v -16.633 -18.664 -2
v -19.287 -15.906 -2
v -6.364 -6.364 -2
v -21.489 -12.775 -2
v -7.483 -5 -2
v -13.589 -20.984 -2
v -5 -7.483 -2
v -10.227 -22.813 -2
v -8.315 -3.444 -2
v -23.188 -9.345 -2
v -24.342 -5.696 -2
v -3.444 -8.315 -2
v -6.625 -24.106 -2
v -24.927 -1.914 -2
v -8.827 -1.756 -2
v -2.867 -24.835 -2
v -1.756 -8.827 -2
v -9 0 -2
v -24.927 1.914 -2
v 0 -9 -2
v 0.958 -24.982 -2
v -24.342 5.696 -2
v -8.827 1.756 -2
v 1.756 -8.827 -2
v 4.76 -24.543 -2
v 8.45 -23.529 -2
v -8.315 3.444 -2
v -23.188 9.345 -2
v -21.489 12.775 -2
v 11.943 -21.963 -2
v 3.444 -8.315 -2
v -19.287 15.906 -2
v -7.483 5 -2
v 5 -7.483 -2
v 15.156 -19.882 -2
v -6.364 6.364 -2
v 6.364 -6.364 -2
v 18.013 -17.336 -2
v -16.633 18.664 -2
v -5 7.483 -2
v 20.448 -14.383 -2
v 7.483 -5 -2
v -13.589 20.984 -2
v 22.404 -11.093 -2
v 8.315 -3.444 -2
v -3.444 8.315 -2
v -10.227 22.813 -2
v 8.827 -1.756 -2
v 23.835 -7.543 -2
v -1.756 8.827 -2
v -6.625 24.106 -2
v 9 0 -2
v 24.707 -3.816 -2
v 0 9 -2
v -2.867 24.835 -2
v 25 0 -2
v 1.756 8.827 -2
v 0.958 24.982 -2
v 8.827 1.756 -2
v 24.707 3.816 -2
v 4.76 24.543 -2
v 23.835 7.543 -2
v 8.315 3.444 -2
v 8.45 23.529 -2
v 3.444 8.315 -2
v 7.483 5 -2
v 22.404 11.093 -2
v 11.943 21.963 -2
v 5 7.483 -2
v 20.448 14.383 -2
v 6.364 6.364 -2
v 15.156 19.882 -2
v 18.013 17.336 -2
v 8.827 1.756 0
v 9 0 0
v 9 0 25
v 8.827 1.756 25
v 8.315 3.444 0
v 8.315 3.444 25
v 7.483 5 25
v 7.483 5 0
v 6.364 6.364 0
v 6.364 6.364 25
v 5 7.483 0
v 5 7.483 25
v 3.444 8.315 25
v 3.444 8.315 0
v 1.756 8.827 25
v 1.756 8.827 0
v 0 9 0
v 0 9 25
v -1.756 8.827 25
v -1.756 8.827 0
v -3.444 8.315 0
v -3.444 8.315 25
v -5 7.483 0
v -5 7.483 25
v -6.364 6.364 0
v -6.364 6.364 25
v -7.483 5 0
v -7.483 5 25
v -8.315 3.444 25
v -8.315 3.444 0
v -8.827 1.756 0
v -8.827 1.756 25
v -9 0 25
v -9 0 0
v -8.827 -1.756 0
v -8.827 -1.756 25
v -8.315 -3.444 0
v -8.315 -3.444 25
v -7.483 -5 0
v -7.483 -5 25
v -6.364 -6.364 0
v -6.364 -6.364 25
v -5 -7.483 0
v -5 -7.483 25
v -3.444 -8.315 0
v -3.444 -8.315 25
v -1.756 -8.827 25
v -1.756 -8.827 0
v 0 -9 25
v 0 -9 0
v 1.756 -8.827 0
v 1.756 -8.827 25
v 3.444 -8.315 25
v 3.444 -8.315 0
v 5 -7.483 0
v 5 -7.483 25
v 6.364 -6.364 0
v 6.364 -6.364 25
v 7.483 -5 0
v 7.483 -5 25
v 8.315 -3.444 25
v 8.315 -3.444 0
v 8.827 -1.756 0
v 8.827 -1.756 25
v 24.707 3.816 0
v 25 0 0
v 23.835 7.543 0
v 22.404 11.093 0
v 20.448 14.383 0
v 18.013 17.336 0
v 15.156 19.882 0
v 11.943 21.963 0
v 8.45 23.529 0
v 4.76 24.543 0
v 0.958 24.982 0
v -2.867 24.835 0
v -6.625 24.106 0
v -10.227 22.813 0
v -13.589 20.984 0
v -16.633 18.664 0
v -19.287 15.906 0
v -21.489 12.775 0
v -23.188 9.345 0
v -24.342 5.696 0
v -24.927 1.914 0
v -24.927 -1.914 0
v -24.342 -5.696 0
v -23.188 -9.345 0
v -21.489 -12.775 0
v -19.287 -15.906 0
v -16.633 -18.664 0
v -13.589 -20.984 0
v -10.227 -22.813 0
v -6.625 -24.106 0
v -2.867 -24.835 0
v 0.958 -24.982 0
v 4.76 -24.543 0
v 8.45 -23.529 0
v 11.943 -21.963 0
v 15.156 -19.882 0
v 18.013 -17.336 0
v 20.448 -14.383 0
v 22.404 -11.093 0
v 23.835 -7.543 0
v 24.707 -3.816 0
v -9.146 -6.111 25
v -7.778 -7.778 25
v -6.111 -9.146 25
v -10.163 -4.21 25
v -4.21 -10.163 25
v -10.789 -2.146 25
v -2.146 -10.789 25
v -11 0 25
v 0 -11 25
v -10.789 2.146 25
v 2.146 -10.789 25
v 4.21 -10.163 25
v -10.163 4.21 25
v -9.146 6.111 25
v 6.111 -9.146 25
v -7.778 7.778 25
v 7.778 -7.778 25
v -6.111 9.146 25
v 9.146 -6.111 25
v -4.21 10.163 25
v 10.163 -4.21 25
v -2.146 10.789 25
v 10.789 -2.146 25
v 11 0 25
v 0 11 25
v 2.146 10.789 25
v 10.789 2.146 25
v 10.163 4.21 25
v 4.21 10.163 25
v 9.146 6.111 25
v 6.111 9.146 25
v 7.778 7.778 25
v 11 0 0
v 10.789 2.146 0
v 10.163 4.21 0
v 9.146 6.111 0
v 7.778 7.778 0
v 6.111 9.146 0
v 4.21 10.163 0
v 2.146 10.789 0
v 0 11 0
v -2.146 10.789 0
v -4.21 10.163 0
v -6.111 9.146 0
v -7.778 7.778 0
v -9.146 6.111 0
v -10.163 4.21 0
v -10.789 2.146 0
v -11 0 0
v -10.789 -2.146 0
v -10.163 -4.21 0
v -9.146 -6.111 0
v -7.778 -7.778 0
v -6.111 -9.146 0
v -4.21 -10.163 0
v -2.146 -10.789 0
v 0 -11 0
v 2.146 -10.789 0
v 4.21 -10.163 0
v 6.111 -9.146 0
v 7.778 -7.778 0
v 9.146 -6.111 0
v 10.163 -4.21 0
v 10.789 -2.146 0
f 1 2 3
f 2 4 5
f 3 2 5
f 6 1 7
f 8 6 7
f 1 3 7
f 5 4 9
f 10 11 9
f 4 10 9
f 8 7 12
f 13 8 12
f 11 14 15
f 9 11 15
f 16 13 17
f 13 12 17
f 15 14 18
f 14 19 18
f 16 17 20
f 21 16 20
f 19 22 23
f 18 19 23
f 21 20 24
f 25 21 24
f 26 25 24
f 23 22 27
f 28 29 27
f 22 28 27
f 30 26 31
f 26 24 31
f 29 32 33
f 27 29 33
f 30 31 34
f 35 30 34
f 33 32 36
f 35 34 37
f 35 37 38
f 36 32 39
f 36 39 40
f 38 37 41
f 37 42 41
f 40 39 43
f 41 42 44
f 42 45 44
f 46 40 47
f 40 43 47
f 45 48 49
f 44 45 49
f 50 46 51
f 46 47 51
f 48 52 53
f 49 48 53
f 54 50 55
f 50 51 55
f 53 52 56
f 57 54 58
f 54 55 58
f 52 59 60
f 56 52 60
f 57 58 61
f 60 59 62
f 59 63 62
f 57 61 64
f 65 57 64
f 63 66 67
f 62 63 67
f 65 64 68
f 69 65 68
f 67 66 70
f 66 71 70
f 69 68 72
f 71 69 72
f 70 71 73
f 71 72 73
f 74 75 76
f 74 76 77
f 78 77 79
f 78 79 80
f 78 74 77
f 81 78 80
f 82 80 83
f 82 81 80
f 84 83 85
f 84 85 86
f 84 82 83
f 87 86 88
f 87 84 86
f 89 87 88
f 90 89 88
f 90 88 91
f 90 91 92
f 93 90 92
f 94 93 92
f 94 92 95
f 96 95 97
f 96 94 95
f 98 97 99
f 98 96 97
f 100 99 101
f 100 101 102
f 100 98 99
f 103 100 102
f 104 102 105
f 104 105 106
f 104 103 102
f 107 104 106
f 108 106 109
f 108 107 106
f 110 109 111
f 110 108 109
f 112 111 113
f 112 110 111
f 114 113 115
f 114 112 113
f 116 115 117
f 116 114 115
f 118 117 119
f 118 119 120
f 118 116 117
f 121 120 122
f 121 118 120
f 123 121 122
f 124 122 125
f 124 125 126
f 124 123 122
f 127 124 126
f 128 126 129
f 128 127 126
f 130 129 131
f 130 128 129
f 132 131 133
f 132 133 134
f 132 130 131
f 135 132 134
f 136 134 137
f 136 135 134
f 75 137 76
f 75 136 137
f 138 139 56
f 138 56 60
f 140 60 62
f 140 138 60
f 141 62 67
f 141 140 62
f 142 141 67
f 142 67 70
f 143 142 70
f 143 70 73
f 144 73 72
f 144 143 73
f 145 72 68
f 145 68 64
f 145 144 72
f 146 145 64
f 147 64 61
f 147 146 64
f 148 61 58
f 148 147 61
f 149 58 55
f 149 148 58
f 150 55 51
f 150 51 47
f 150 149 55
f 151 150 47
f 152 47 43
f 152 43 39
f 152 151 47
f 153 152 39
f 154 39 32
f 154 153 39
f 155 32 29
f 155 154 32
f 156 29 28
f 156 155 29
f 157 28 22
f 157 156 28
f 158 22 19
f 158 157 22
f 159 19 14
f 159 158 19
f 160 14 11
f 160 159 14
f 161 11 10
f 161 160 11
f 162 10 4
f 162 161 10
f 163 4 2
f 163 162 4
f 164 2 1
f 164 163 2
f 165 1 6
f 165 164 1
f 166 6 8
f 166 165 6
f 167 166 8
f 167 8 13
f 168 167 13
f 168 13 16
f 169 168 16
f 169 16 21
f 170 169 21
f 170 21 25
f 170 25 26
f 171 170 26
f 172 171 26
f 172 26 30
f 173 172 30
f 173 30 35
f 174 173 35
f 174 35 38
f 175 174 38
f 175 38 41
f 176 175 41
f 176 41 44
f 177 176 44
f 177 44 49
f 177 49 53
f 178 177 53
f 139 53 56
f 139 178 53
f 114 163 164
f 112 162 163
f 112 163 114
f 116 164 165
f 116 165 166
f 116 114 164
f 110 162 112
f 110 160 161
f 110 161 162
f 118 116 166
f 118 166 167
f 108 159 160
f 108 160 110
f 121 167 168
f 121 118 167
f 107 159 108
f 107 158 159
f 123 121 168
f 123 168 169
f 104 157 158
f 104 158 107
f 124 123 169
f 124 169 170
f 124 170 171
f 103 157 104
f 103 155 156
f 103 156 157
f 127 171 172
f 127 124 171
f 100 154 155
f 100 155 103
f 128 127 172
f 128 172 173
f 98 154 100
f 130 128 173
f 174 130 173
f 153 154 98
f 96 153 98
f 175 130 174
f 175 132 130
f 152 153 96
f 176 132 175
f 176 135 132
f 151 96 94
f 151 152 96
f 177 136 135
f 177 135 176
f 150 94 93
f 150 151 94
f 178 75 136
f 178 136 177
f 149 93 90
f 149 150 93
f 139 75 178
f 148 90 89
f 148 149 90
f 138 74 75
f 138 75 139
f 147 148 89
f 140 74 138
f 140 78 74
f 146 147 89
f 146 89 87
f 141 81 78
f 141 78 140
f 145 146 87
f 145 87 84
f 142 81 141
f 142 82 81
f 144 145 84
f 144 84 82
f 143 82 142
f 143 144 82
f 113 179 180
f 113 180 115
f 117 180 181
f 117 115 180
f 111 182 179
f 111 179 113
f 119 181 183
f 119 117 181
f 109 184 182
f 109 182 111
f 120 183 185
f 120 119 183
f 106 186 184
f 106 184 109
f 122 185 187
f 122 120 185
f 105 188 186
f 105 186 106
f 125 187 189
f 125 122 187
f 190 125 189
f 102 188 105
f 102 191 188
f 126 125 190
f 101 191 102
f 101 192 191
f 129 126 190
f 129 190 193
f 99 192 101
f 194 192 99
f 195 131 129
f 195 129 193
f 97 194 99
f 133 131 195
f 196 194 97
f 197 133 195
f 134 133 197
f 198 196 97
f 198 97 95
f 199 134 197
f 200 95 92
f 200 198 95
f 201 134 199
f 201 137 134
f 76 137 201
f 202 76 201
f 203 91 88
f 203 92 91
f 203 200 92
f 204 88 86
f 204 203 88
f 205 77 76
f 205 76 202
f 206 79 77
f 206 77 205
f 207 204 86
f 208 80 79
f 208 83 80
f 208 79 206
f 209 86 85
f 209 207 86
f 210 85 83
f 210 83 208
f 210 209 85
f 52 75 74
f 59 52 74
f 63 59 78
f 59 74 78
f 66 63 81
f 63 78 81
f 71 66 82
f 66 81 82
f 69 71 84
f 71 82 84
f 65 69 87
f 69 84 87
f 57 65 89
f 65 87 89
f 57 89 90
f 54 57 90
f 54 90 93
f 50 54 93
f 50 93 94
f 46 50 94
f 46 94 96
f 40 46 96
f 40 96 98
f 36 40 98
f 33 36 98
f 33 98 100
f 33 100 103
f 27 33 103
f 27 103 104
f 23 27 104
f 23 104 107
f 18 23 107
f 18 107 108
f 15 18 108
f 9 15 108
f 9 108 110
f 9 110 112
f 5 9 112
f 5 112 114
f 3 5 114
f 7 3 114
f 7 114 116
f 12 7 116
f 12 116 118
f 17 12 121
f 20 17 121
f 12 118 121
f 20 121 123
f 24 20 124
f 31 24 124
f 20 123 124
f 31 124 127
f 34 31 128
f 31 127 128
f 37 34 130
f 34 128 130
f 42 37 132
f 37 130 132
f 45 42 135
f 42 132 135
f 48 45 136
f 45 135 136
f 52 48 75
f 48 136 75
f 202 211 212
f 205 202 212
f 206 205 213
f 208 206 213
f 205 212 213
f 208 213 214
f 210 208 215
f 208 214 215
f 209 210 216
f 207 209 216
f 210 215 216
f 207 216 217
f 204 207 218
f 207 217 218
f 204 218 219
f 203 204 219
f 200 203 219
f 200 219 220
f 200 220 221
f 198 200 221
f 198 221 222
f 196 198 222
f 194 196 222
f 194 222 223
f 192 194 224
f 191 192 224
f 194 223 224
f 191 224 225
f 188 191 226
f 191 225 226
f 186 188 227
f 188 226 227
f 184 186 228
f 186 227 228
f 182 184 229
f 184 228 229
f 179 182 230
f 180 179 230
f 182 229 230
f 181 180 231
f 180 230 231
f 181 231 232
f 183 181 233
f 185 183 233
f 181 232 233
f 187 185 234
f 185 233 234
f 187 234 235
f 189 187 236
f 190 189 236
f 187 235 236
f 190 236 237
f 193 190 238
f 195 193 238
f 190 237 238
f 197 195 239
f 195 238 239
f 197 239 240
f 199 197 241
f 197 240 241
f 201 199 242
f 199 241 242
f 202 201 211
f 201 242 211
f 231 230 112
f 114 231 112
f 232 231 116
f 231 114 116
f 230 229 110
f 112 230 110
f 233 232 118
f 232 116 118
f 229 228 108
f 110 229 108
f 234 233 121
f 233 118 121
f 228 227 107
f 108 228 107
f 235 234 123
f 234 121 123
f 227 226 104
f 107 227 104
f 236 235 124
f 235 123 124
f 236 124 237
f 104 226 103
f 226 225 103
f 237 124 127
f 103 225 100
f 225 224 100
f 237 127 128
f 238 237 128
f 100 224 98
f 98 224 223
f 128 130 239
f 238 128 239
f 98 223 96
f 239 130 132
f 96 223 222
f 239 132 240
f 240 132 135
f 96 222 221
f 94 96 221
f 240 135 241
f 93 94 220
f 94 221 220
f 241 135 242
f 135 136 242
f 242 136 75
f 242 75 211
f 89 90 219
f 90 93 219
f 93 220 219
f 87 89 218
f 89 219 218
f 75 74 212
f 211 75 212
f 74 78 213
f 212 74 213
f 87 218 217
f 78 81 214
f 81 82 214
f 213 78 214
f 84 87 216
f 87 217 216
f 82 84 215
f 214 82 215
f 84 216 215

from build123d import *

# Parameters (mm, degrees)
F0_R     = 25
F1_DEPTH = 2
F2_R     = 9
F3_DEPTH = 25
F4_R     = 11
F4_R_2   = 9
F5_DEPTH = 25


with BuildPart() as f1:
    # F0 (on Top) → F1 (new body)
    with BuildSketch(Plane.XY):
        Circle(F0_R)
    extrude(amount=-F1_DEPTH)

    # F2 (on Top) → F3 (cut)
    with BuildSketch(Plane.XY):
        Circle(F2_R)
    extrude(amount=-F3_DEPTH, mode=Mode.SUBTRACT)


with BuildPart() as f5:
    # F4 (on Top) → F5 (new body)
    with BuildSketch(Plane.XY):
        Circle(F4_R)
        Circle(F4_R_2, mode=Mode.SUBTRACT)
    extrude(amount=F5_DEPTH)


solid = Compound([f1.part, f5.part])
